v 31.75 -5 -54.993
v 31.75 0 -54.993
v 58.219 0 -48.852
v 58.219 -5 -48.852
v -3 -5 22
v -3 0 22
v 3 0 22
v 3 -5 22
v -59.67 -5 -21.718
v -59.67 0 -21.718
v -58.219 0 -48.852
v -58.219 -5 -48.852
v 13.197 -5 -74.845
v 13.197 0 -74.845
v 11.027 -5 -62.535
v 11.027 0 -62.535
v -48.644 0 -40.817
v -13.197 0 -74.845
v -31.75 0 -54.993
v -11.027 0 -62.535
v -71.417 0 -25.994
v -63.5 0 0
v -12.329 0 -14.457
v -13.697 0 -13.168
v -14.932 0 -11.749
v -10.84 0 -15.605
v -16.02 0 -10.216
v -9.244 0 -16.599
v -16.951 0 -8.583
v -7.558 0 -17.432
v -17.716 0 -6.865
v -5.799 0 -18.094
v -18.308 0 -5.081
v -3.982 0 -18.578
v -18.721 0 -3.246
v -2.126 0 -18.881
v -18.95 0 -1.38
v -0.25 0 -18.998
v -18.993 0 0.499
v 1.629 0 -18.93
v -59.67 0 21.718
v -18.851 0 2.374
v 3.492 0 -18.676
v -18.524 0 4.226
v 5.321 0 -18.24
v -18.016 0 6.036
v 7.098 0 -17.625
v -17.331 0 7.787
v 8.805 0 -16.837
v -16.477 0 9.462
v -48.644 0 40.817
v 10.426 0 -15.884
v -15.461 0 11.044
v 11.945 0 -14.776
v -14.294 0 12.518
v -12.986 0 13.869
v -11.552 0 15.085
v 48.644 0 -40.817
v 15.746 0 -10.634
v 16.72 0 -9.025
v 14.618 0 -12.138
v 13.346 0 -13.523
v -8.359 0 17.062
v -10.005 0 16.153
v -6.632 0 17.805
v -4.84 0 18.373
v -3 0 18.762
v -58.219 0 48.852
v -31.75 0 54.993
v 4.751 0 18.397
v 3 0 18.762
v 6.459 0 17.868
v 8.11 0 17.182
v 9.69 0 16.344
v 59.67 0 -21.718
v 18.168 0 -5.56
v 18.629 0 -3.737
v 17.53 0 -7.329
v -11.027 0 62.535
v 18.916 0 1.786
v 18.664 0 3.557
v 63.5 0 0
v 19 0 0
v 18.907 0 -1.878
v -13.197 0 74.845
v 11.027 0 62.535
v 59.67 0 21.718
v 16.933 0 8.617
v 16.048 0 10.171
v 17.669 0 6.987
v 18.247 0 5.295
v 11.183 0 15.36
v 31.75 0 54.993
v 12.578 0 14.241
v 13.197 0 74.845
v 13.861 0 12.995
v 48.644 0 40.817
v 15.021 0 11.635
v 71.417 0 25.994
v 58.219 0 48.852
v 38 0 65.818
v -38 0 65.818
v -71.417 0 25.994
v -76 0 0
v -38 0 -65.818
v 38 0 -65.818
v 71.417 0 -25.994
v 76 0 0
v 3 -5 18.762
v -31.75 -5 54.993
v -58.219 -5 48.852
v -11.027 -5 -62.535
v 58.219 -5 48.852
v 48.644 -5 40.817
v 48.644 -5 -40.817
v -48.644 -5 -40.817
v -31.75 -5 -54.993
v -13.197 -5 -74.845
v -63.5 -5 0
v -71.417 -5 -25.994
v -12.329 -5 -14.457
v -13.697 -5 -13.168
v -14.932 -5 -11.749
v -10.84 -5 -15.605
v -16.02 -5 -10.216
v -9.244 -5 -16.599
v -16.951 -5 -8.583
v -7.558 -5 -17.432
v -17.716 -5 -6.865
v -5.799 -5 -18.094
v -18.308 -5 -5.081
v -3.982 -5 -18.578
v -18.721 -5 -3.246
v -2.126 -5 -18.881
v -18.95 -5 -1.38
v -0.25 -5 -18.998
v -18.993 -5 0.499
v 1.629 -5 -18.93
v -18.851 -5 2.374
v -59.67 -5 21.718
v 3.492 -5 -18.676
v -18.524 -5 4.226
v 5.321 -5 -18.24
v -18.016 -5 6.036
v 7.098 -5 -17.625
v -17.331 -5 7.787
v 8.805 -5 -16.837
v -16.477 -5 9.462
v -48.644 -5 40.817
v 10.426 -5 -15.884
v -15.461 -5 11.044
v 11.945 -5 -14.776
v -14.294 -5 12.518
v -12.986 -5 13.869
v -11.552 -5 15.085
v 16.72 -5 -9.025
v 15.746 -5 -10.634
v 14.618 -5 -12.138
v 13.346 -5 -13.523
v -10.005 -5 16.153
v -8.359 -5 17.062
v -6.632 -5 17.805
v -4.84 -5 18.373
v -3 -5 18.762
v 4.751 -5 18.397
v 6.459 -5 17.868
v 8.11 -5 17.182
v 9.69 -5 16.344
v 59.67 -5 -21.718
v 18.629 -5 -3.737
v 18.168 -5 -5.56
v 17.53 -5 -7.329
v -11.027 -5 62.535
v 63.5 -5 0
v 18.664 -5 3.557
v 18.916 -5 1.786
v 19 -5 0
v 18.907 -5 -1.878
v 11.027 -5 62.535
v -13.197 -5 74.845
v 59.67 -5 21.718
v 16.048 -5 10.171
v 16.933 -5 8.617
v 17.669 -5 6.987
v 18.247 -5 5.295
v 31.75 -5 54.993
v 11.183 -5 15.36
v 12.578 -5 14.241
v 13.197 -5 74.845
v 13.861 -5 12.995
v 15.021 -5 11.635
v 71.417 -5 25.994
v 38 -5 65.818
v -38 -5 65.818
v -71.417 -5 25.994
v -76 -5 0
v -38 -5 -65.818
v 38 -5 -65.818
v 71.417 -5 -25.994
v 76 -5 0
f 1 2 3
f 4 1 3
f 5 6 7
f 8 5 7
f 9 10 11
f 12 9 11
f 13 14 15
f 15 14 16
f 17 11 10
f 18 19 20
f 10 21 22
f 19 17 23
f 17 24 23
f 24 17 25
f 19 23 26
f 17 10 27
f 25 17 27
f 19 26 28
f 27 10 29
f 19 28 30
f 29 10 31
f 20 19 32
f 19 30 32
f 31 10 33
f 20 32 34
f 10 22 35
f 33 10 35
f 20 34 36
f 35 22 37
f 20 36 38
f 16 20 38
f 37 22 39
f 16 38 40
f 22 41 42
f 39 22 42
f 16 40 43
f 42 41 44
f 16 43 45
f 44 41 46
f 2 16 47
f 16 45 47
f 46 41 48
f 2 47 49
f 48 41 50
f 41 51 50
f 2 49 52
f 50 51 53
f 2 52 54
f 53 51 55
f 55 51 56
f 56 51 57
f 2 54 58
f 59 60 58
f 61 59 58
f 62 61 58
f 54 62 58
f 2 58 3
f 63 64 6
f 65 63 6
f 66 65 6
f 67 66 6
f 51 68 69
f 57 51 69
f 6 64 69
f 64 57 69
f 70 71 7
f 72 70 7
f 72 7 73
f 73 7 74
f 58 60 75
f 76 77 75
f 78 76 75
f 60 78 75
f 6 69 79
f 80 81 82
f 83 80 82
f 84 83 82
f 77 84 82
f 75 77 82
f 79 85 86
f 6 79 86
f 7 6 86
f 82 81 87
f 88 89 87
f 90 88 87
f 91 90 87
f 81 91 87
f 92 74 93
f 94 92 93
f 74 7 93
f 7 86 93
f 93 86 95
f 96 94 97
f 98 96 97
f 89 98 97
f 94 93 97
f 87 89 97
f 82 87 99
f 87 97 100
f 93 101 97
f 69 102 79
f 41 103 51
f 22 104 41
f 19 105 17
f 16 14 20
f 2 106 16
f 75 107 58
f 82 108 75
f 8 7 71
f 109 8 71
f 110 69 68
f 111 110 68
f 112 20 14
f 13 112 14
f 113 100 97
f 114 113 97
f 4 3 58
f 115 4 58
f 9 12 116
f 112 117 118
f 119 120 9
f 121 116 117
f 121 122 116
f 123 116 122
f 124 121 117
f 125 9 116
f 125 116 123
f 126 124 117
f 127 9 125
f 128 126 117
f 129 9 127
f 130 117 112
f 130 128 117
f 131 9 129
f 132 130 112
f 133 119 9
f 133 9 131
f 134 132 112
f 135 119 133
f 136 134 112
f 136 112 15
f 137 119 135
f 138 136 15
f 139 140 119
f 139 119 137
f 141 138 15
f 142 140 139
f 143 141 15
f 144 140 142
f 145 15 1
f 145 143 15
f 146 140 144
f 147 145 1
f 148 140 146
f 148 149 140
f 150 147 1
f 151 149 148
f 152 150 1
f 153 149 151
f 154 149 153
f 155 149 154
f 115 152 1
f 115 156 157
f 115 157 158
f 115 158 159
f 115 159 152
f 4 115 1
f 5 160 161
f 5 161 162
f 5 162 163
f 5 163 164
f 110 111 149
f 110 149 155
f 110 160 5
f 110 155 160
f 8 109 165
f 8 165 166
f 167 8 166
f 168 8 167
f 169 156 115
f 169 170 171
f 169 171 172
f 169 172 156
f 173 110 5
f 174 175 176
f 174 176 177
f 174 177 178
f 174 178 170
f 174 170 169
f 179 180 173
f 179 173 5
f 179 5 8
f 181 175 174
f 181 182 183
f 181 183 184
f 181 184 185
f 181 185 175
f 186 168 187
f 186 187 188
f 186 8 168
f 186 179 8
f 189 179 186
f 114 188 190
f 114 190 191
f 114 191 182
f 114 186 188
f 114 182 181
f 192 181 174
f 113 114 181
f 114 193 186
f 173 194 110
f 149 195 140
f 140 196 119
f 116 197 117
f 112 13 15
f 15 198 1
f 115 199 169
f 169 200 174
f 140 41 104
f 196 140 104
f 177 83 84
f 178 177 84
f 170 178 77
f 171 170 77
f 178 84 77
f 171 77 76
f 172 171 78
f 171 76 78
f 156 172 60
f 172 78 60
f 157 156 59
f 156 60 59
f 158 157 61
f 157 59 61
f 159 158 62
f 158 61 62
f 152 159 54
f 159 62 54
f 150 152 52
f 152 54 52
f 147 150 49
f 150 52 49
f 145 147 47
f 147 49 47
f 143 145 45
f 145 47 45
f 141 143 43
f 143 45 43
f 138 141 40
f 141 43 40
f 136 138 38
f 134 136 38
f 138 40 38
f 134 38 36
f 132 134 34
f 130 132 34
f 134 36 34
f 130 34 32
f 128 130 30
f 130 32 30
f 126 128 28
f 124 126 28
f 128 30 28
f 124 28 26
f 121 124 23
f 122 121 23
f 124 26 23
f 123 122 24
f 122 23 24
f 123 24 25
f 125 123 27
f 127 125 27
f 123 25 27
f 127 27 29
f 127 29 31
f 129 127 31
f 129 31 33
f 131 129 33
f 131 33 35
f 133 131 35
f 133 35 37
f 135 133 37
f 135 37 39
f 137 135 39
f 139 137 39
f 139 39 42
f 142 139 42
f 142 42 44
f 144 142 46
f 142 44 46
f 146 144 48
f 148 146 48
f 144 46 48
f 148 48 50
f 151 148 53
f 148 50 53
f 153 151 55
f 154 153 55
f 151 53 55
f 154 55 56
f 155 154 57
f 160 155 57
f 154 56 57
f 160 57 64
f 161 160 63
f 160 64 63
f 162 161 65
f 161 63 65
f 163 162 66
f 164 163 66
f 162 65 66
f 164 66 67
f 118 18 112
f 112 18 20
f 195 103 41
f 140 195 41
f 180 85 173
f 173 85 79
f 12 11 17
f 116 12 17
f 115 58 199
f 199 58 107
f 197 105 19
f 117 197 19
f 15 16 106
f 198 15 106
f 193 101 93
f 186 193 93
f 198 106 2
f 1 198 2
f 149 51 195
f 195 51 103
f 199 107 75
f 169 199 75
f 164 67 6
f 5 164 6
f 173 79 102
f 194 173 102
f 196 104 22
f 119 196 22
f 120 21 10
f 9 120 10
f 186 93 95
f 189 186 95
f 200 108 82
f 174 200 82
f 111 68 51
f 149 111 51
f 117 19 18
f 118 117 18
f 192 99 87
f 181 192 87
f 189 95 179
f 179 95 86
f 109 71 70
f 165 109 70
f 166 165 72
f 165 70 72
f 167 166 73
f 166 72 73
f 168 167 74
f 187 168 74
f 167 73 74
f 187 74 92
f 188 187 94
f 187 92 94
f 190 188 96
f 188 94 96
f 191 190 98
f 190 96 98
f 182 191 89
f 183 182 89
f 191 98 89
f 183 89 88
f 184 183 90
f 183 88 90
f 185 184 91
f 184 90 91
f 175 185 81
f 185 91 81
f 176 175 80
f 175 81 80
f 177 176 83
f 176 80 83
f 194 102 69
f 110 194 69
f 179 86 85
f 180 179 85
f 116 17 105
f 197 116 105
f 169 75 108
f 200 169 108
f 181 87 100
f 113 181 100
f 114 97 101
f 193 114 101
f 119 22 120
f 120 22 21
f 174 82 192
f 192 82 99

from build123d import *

# Parameters (mm, degrees)
F1_DEPTH = 5


with BuildPart() as f1:
    # F0 (on Front) → F1 (new body)
    with BuildSketch(Plane.XZ):
        Polygon((71.416639, 25.993531), (59.670481, 21.718279), (58.219378, 48.851858), (48.643822, 40.817013), (38, 65.817931), (31.75, 54.992613), (13.197262, 74.845389), (11.026659, 62.535292), (-13.197262, 74.845389), (-11.026659, 62.535292), (-38, 65.817931), (-31.75, 54.992613), (-58.219378, 48.851858), (-48.643822, 40.817013), (-71.416639, 25.993531), (-59.670481, 21.718279), (-76, 0), (-63.5, 0), (-71.416639, -25.993531), (-59.670481, -21.718279), (-58.219378, -48.851858), (-48.643822, -40.817013), (-38, -65.817931), (-31.75, -54.992613), (-13.197262, -74.845389), (-11.026659, -62.535292), (13.197262, -74.845389), (11.026659, -62.535292), (38, -65.817931), (31.75, -54.992613), (58.219378, -48.851858), (48.643822, -40.817013), (71.416639, -25.993531), (59.670481, -21.718279), (76, 0), (63.5, 0), align=None)
        with BuildLine():
            ThreePointArc((3, 18.761663), (14.456832, 12.328828), (19, 0))
            ThreePointArc((19, 0), (-12.328828, -14.456832), (-3, 18.761663))
            Line((-3, 18.761663), (-3, 22))
            Line((-3, 22), (3, 22))
            Line((3, 22), (3, 18.761663))
        make_face(mode=Mode.SUBTRACT)
    extrude(amount=F1_DEPTH)


solid = f1.part
